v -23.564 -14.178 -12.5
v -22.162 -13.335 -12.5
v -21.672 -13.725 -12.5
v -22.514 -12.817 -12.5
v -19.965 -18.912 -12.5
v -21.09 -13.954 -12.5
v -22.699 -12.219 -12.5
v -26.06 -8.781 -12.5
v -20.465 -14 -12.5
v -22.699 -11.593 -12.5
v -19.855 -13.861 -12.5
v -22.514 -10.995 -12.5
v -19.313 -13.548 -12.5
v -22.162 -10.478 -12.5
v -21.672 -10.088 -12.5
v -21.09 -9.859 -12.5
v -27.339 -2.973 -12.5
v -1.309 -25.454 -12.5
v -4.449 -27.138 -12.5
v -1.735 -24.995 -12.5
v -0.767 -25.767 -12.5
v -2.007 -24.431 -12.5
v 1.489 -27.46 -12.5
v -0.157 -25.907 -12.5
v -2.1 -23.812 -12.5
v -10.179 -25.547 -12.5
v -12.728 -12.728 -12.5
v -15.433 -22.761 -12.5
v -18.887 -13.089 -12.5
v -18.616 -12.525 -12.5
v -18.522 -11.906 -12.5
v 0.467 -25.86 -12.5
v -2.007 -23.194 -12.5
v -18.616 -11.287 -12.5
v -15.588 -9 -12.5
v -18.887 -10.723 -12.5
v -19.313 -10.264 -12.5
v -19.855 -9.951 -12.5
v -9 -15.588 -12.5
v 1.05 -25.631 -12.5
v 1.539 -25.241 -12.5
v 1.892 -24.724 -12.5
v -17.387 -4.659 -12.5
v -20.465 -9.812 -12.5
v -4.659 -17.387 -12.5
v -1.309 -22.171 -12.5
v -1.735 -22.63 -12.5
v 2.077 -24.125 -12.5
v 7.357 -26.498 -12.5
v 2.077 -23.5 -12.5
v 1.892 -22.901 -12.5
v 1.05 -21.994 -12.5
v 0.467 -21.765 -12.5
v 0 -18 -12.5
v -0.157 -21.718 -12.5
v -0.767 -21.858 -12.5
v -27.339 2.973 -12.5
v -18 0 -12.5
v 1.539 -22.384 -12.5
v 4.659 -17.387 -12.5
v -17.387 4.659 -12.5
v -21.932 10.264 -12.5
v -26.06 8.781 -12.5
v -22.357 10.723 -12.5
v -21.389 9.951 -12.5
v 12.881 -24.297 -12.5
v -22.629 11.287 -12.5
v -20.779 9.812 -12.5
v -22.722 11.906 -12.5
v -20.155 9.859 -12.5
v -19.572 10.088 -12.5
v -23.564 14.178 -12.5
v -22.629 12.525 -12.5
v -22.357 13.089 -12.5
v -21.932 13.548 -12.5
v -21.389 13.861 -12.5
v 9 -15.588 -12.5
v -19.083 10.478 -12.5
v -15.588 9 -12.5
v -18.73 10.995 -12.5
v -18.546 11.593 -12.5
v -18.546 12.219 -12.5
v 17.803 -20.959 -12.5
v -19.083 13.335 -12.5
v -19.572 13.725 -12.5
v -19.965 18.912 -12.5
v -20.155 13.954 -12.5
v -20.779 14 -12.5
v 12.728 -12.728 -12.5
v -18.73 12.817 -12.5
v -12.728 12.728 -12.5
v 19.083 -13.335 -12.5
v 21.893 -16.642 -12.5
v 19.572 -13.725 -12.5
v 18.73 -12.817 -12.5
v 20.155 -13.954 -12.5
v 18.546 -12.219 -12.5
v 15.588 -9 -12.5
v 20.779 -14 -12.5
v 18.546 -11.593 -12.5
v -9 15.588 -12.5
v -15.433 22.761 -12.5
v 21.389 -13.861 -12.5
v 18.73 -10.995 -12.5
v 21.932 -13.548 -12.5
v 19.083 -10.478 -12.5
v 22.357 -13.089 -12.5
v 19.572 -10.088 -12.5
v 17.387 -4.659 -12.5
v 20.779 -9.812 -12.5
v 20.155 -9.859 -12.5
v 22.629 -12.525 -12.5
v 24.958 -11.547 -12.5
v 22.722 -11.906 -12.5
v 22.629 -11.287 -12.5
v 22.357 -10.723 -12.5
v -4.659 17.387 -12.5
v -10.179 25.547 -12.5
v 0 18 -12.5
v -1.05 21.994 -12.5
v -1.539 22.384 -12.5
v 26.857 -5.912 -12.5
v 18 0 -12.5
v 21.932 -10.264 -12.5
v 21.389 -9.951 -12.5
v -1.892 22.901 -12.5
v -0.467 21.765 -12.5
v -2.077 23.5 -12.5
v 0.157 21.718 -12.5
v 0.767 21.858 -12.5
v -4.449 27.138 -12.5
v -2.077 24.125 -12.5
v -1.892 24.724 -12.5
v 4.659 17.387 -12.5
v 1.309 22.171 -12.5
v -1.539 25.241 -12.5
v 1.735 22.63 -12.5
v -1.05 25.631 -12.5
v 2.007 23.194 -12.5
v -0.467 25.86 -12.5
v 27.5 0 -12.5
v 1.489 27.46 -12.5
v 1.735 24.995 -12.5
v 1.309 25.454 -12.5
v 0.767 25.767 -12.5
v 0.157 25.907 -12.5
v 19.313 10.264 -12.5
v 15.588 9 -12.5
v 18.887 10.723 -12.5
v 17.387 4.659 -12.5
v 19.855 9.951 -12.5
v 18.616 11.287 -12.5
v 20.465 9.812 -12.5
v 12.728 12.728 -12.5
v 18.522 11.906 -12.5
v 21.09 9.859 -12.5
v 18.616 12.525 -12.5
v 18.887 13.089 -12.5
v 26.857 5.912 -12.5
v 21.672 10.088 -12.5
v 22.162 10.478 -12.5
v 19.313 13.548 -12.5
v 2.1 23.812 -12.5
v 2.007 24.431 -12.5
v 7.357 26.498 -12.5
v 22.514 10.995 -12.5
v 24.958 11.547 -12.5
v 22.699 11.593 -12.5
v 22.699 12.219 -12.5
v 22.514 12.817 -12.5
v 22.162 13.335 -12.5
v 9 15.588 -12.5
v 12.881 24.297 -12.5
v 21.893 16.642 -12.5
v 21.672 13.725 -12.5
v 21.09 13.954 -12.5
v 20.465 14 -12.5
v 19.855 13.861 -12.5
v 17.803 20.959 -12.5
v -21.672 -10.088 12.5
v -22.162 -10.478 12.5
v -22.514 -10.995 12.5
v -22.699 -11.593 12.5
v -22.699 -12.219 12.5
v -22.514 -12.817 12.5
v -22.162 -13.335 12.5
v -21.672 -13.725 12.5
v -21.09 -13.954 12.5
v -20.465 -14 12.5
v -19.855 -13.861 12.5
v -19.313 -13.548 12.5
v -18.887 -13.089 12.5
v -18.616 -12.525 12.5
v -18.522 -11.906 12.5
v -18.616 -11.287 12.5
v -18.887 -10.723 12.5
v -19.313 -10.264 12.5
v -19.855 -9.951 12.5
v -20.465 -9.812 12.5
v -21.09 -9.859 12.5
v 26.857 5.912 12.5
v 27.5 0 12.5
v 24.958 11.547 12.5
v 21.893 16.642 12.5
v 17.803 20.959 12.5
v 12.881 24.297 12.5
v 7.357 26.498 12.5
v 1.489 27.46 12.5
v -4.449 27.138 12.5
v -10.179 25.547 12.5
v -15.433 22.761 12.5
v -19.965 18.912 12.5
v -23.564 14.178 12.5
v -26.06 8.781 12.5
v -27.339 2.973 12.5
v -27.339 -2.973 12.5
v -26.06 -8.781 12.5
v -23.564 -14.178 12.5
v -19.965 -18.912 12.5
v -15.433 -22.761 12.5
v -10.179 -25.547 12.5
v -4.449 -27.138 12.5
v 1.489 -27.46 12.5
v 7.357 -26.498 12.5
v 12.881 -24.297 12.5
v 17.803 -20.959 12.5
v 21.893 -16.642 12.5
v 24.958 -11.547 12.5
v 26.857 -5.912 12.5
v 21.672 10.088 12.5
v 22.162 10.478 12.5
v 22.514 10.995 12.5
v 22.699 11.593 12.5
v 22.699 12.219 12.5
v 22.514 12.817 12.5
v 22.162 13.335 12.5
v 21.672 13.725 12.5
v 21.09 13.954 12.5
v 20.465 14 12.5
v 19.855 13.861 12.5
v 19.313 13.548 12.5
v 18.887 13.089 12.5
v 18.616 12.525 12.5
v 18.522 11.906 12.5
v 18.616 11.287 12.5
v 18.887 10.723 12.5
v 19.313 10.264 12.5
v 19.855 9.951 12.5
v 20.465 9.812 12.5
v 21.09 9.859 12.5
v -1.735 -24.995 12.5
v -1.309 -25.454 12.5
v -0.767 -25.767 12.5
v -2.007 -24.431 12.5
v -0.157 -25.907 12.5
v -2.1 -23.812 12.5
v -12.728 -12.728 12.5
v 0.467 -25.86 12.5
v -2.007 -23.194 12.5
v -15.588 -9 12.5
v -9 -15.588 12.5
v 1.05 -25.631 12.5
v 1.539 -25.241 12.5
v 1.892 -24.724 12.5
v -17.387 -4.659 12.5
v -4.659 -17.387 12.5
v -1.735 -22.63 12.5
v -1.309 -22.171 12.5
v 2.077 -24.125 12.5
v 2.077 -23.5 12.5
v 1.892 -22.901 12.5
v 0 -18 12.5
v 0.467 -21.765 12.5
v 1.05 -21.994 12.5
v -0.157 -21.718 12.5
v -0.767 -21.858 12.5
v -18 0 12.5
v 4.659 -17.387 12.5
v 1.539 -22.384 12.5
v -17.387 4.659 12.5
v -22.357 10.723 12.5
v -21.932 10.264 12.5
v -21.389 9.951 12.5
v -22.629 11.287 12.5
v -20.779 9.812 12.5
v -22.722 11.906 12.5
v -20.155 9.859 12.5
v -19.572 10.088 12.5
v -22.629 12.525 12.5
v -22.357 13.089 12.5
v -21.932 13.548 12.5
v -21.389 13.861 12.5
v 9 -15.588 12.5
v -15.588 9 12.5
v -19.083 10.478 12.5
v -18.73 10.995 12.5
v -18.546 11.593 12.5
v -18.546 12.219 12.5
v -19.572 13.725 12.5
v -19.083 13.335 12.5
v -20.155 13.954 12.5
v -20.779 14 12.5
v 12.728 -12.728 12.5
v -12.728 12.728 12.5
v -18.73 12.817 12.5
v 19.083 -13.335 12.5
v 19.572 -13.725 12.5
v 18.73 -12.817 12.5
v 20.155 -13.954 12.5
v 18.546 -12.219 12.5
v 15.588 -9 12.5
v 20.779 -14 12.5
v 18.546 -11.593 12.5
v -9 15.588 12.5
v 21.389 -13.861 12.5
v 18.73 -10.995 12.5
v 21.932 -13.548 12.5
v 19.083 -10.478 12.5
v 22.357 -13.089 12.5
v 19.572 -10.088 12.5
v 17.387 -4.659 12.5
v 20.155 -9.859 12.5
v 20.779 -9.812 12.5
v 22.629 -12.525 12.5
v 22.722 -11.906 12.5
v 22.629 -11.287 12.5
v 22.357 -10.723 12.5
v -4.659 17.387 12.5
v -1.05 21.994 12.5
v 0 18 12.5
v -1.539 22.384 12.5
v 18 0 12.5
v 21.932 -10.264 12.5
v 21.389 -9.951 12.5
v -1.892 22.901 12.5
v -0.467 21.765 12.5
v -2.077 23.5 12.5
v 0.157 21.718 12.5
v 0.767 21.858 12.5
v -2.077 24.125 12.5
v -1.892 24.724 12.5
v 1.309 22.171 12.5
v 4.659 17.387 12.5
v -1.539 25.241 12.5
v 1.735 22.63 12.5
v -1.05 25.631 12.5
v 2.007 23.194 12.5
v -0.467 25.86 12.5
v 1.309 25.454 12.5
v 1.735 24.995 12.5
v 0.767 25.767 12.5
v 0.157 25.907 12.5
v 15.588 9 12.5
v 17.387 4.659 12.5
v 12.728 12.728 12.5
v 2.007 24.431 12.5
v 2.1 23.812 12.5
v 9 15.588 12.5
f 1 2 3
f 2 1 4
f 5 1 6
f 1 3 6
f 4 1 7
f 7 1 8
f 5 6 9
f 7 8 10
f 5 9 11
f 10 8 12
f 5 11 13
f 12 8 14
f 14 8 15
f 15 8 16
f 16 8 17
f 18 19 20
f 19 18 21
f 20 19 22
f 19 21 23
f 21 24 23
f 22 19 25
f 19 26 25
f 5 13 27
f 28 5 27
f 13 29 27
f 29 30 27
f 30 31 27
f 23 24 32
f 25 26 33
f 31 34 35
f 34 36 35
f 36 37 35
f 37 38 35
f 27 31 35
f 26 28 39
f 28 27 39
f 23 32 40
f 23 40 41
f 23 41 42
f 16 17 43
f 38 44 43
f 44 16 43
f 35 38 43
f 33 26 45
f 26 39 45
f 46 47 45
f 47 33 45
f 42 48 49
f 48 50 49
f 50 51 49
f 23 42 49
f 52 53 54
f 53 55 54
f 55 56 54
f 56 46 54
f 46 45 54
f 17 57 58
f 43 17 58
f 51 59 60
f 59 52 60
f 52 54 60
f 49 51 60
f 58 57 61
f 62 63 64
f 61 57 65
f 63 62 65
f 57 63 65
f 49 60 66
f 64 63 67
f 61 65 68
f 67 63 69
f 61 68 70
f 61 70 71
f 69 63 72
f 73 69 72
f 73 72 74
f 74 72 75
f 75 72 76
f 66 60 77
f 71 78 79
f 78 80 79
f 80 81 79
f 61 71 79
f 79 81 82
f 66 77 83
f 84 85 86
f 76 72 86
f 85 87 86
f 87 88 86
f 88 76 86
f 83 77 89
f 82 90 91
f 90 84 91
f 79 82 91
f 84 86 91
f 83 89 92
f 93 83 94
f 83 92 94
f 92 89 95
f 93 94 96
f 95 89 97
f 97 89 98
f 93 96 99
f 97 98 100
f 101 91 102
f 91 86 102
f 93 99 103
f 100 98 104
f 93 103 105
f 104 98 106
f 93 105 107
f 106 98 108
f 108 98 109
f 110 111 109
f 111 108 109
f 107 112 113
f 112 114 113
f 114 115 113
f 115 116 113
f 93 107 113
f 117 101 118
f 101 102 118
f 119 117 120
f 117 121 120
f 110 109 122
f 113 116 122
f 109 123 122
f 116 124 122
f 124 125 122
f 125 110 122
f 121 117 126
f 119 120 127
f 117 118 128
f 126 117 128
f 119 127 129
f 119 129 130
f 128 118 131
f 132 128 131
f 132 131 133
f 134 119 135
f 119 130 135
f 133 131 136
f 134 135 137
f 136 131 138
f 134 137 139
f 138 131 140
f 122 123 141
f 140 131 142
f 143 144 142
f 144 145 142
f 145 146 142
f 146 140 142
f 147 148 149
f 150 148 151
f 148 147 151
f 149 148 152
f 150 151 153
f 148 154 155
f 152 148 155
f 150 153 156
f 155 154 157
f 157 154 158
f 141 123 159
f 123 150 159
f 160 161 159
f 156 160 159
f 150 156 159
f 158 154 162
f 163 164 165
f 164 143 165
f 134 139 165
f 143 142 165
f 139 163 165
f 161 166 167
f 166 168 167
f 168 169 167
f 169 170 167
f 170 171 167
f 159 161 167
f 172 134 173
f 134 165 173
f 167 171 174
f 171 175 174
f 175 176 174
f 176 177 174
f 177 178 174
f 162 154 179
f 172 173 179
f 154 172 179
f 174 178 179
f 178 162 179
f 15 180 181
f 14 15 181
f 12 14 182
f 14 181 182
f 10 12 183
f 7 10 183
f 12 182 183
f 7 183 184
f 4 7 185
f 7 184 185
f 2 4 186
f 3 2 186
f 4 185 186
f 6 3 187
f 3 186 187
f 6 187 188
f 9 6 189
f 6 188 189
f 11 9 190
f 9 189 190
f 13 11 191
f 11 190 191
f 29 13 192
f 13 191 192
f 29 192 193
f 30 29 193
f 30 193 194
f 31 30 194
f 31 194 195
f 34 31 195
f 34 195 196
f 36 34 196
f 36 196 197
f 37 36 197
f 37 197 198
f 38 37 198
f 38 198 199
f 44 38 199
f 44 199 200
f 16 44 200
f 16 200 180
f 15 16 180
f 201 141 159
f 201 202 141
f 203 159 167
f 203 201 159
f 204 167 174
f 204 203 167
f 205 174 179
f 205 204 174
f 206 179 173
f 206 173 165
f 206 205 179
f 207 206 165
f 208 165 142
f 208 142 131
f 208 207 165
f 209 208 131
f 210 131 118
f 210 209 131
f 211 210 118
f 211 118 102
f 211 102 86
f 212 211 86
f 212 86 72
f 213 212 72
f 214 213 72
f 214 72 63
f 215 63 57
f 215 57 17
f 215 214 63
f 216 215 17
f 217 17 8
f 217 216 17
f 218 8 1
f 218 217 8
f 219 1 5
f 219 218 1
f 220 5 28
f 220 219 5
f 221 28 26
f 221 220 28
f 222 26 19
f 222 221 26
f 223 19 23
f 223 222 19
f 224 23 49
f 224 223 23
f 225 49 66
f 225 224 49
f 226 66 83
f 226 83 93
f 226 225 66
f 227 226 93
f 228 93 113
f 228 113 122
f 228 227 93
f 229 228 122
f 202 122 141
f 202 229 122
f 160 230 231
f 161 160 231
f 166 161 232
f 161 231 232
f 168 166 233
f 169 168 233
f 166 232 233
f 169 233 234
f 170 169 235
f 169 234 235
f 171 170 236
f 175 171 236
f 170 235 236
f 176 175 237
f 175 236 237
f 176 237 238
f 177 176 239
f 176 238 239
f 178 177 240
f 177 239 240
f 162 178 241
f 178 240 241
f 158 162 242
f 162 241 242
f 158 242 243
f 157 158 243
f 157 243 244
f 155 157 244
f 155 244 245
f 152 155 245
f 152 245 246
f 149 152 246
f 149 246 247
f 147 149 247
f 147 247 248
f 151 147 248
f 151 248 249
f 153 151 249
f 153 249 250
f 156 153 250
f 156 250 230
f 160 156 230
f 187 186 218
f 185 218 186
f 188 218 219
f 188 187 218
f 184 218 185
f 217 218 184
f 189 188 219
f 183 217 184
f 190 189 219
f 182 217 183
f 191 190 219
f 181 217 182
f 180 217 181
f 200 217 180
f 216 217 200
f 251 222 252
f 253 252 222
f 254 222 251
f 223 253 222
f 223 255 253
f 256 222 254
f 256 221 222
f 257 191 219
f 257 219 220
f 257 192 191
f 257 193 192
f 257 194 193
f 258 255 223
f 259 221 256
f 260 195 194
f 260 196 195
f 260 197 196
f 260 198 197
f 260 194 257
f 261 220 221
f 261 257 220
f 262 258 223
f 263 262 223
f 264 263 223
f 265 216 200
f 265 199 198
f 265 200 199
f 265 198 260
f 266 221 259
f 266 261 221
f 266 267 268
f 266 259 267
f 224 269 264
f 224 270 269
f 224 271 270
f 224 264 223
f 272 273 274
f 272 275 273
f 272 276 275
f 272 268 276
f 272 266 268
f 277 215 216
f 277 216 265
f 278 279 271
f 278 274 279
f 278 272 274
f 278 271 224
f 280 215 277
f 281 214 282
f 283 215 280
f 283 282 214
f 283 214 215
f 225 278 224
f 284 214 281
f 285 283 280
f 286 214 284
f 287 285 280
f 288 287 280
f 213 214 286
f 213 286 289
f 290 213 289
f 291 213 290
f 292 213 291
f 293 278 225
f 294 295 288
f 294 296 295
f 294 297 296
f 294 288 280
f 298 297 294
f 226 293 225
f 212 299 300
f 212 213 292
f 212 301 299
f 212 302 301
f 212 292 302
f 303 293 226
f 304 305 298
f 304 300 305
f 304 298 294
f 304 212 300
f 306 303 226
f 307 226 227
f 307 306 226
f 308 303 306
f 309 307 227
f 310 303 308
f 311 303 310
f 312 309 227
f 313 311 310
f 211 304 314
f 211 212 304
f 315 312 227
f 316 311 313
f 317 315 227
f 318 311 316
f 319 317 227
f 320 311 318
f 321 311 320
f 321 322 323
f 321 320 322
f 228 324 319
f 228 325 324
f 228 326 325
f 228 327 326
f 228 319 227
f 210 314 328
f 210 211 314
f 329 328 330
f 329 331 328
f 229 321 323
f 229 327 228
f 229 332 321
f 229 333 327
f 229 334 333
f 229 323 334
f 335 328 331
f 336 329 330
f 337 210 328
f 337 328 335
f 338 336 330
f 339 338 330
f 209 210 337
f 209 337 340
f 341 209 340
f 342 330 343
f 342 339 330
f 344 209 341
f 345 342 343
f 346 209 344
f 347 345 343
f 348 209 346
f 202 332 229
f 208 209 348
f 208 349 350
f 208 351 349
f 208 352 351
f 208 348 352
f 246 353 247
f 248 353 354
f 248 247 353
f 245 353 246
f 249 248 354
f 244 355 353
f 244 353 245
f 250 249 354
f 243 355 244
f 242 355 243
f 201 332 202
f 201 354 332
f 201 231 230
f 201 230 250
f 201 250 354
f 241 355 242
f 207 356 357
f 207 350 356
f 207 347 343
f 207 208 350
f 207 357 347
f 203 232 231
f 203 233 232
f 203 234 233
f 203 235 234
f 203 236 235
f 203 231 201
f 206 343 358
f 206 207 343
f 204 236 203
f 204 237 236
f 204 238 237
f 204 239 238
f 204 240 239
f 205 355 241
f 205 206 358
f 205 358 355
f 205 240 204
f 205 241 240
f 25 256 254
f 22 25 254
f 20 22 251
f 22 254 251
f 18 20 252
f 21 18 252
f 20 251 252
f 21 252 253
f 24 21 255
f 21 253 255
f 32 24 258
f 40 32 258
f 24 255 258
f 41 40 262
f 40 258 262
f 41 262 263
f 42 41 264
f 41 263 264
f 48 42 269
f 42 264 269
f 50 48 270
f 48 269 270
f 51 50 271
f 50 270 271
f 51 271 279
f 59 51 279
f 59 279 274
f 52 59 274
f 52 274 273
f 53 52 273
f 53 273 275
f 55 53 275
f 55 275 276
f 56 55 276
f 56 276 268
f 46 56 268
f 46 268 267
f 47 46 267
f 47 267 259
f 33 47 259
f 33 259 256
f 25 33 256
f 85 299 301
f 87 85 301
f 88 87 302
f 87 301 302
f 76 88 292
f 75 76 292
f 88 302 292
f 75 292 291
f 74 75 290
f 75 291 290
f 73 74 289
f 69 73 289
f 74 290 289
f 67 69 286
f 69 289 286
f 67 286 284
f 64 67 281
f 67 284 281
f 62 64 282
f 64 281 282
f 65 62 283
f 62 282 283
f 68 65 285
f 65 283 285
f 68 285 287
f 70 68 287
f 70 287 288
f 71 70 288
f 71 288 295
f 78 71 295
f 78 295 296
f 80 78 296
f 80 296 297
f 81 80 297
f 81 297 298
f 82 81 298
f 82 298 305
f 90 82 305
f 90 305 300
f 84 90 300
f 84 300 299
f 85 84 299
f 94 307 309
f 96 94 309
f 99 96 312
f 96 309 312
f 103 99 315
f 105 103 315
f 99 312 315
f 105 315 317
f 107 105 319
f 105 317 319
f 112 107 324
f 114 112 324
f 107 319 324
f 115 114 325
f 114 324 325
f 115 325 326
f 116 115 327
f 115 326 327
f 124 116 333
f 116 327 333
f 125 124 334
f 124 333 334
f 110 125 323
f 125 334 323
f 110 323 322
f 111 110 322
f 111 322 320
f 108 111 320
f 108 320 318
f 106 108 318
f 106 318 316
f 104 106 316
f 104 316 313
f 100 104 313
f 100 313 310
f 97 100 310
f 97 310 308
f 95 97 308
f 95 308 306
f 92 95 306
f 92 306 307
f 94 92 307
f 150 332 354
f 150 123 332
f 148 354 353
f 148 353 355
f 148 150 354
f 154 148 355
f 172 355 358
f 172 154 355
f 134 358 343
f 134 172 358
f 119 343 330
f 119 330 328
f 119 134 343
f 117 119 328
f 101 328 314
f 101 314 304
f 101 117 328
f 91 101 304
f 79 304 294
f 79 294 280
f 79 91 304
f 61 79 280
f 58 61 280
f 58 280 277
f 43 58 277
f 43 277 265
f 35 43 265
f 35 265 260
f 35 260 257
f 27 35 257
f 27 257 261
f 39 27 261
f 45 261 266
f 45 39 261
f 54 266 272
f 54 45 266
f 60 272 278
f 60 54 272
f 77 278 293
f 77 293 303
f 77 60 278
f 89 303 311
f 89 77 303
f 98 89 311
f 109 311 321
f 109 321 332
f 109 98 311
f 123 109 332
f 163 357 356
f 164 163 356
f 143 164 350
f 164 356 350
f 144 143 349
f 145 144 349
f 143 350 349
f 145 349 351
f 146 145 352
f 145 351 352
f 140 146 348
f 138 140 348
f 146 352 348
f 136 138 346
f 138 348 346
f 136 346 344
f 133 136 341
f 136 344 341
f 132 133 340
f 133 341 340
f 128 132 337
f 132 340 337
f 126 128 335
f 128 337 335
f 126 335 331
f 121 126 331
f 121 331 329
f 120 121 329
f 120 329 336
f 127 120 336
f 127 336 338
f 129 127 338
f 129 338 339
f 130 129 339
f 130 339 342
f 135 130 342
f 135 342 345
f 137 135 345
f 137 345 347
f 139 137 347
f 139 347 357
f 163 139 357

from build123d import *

# Parameters (mm, degrees)
SKETCH2_R                       = 27.5
SKETCH2_R_2                     = 18
BOSS_EXTRUDE1_DEPTH             = 12.5
TAP_DRILL_FOR_M5X0_8_TAP1_D     = 4.2
TAP_DRILL_FOR_M5X0_8_TAP1_DEPTH = 25.001
CIRPATTERN5_COUNT               = 6


with BuildPart() as part:
    # Sketch2 → Boss-Extrude1 (new body, symmetric)
    with BuildSketch(Plane.XY):
        Circle(SKETCH2_R)
        Circle(SKETCH2_R_2, mode=Mode.SUBTRACT)
    extrude(amount=BOSS_EXTRUDE1_DEPTH, both=True)

    # Tap Drill for M5x0.8 Tap1
    with Locations(Plane(origin=(0, 0, -12.5), x_dir=(-1, 0, 0), z_dir=(0, 0, -1))):
        with Locations((0, 23.8125)):
            tap_drill_for_m5x0_8_tap1 = Hole(TAP_DRILL_FOR_M5X0_8_TAP1_D / 2, depth=TAP_DRILL_FOR_M5X0_8_TAP1_DEPTH)

    # CirPattern5: Tap Drill for M5x0.8 Tap1 ×6 about axis
    cirpattern5_axis = Axis((0, 0, 0), (0, 0, 1))
    for i in range(1, CIRPATTERN5_COUNT):
        add(tap_drill_for_m5x0_8_tap1.rotate(cirpattern5_axis, i * 360 / CIRPATTERN5_COUNT), mode=Mode.SUBTRACT)


solid = part.part
